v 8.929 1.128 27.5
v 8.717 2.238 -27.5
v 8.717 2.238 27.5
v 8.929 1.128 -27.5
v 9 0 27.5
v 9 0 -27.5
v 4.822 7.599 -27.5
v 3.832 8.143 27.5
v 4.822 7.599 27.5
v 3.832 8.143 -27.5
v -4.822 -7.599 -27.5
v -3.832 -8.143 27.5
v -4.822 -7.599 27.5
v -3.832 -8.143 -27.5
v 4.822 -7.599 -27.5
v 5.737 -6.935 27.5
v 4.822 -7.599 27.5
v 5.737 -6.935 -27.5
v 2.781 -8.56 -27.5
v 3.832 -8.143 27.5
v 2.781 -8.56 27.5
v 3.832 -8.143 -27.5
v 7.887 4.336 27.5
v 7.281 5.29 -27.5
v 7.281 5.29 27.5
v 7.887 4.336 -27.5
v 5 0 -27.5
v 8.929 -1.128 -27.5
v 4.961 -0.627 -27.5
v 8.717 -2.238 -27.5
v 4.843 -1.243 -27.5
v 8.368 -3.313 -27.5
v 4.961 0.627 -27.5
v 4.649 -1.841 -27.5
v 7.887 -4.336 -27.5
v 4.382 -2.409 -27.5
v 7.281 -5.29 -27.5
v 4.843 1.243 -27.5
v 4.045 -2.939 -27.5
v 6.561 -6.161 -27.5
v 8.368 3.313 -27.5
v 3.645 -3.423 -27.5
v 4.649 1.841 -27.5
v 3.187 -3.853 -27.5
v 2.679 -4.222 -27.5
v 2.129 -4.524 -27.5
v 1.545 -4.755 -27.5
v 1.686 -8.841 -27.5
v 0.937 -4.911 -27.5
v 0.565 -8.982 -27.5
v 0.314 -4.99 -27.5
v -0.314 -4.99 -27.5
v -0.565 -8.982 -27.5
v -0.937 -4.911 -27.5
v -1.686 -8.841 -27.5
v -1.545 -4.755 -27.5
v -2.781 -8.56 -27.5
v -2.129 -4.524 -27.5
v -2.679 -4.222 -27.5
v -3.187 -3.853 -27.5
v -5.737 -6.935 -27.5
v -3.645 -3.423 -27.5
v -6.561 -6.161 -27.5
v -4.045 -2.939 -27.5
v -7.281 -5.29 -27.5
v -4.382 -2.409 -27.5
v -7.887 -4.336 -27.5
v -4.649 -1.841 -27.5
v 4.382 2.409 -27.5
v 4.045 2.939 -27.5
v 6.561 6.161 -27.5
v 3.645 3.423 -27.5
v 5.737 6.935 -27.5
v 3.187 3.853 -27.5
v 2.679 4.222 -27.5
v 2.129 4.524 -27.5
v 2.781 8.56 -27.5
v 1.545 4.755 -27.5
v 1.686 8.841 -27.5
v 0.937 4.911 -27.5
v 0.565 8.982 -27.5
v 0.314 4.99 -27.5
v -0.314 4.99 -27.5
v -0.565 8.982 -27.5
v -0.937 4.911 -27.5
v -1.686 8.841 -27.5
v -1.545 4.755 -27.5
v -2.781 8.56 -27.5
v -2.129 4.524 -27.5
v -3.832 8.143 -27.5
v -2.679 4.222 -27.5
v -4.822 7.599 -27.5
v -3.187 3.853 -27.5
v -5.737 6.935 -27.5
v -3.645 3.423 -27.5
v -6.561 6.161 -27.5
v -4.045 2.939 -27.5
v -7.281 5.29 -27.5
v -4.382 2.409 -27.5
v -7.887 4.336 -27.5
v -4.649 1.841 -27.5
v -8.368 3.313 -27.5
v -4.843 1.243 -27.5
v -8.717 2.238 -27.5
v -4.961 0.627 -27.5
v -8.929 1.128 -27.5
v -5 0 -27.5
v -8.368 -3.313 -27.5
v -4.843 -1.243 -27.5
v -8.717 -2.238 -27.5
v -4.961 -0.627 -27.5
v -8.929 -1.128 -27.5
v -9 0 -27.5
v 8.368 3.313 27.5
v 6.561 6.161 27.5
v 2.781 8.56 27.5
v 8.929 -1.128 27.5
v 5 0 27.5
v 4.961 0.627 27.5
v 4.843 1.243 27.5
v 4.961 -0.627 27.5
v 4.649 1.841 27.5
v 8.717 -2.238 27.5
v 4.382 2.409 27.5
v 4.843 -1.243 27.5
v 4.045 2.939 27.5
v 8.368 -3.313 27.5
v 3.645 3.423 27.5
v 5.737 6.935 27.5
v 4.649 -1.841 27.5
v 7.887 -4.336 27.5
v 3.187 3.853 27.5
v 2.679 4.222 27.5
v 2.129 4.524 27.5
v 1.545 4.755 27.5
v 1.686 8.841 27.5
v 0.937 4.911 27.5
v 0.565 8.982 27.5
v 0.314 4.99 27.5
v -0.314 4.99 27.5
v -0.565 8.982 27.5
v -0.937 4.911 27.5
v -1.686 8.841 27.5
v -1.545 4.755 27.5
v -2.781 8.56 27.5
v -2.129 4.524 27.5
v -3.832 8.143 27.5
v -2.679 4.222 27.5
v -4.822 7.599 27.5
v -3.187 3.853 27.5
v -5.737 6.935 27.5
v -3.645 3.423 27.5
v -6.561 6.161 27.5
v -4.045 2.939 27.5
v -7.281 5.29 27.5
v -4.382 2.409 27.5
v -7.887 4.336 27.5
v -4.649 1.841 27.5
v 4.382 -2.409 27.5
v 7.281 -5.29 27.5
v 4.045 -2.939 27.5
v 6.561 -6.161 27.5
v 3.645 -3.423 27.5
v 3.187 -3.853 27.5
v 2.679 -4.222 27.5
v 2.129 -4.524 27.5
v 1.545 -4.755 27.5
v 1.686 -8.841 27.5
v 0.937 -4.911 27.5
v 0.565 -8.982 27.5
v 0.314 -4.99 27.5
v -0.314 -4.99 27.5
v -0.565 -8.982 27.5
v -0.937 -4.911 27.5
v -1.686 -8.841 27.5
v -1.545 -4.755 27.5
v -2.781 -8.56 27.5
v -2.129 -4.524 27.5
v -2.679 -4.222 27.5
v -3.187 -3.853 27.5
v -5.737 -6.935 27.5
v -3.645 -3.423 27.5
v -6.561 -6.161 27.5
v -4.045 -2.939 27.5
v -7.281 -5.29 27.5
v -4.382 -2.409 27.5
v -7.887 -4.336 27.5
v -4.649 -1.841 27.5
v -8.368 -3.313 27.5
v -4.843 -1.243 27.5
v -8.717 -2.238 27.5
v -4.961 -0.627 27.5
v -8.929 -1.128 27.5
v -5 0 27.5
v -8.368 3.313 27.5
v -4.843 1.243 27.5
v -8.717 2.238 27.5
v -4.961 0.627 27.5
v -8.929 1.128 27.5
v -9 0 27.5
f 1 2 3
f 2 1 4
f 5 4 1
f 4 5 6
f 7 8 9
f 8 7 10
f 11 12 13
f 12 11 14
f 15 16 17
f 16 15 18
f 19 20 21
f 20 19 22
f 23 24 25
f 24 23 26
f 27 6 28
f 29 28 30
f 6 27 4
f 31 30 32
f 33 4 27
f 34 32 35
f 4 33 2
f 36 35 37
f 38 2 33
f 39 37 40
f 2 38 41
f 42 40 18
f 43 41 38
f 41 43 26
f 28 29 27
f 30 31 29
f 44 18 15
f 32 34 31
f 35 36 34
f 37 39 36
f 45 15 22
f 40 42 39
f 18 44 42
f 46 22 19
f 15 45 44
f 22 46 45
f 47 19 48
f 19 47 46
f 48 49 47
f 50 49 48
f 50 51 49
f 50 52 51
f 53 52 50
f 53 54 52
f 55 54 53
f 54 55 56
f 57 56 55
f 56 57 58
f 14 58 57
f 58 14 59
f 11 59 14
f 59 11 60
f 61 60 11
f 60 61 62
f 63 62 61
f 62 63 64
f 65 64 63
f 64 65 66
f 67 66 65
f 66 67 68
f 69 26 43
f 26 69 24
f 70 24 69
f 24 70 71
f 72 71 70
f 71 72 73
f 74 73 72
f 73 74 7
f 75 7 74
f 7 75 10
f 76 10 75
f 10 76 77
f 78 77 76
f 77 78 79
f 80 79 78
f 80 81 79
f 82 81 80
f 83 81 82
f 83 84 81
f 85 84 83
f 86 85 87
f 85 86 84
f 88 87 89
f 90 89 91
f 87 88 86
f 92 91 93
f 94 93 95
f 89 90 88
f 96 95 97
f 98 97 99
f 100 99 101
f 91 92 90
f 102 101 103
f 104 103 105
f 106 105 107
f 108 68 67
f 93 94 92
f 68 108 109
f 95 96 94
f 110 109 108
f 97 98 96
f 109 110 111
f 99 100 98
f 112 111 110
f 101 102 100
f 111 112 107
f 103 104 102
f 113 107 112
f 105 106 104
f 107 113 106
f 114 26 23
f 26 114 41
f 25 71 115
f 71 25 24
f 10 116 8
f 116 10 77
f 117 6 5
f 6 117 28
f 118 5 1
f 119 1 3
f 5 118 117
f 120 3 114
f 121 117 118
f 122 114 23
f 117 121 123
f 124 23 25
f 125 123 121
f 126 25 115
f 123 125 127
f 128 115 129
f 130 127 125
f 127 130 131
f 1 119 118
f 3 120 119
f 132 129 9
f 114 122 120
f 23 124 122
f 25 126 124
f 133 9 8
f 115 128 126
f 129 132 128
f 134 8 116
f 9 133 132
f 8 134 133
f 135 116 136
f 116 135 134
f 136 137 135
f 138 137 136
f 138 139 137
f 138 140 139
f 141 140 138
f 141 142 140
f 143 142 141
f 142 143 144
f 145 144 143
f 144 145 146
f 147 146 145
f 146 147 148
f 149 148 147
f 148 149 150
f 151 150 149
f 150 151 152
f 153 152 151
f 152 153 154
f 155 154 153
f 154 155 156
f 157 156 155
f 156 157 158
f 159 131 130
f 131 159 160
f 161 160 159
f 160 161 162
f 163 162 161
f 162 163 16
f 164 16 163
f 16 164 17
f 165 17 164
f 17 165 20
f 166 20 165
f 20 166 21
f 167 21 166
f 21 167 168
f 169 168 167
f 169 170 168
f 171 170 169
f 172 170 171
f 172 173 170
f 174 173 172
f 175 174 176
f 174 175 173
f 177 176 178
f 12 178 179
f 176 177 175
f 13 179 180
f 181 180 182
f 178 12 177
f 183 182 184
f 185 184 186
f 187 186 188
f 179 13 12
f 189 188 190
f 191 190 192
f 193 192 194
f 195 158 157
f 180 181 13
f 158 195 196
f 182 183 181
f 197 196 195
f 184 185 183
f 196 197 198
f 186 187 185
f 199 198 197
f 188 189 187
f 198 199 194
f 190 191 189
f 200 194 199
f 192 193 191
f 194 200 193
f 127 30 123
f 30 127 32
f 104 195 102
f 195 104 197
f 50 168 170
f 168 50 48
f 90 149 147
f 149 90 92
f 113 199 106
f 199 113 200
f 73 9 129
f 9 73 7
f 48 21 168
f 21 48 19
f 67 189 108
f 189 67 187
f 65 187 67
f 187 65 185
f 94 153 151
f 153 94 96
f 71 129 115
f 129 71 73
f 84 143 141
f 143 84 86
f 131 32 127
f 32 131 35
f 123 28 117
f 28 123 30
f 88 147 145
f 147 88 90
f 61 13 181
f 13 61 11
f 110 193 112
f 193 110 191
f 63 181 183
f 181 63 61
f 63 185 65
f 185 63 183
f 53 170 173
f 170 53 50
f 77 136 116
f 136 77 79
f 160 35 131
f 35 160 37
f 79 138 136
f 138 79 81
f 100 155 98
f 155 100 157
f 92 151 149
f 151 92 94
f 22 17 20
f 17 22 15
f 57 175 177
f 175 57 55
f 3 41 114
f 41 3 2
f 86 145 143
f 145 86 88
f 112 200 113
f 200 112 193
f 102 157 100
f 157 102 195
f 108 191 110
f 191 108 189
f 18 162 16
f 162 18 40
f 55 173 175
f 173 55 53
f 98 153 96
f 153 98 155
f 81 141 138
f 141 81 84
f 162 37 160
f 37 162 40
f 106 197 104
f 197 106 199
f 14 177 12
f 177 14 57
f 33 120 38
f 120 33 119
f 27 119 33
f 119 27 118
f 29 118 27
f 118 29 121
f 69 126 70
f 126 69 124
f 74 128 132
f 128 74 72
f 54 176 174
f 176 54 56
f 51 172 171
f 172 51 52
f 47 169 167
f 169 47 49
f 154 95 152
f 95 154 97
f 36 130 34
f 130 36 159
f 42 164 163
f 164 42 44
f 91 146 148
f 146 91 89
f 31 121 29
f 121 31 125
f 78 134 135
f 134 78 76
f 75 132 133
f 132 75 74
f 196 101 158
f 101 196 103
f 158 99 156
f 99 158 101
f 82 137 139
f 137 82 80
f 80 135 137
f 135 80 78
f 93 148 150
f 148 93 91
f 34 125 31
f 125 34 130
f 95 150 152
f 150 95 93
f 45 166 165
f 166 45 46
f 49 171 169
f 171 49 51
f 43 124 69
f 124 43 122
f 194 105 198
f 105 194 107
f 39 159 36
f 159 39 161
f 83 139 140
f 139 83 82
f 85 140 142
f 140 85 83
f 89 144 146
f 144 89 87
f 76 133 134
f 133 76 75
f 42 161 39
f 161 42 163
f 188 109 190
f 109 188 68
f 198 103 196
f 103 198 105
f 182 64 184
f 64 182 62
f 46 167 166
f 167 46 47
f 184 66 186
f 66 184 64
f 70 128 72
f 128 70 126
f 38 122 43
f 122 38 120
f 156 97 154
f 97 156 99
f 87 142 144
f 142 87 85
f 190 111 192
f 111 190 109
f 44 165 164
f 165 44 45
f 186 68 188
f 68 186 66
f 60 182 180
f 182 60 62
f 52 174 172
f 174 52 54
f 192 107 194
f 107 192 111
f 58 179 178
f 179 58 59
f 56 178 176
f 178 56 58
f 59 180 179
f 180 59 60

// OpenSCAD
$fn = 50;


difference() {
	union() {
		translate(v = [0, 0, -27.5000000000]) {
			cylinder(h = 55, r = 9.0000000000);
		}
	}
	union() {
		translate(v = [0, 0, -100.0000000000]) {
			cylinder(h = 200, r = 5.0000000000);
		}
	}
}
